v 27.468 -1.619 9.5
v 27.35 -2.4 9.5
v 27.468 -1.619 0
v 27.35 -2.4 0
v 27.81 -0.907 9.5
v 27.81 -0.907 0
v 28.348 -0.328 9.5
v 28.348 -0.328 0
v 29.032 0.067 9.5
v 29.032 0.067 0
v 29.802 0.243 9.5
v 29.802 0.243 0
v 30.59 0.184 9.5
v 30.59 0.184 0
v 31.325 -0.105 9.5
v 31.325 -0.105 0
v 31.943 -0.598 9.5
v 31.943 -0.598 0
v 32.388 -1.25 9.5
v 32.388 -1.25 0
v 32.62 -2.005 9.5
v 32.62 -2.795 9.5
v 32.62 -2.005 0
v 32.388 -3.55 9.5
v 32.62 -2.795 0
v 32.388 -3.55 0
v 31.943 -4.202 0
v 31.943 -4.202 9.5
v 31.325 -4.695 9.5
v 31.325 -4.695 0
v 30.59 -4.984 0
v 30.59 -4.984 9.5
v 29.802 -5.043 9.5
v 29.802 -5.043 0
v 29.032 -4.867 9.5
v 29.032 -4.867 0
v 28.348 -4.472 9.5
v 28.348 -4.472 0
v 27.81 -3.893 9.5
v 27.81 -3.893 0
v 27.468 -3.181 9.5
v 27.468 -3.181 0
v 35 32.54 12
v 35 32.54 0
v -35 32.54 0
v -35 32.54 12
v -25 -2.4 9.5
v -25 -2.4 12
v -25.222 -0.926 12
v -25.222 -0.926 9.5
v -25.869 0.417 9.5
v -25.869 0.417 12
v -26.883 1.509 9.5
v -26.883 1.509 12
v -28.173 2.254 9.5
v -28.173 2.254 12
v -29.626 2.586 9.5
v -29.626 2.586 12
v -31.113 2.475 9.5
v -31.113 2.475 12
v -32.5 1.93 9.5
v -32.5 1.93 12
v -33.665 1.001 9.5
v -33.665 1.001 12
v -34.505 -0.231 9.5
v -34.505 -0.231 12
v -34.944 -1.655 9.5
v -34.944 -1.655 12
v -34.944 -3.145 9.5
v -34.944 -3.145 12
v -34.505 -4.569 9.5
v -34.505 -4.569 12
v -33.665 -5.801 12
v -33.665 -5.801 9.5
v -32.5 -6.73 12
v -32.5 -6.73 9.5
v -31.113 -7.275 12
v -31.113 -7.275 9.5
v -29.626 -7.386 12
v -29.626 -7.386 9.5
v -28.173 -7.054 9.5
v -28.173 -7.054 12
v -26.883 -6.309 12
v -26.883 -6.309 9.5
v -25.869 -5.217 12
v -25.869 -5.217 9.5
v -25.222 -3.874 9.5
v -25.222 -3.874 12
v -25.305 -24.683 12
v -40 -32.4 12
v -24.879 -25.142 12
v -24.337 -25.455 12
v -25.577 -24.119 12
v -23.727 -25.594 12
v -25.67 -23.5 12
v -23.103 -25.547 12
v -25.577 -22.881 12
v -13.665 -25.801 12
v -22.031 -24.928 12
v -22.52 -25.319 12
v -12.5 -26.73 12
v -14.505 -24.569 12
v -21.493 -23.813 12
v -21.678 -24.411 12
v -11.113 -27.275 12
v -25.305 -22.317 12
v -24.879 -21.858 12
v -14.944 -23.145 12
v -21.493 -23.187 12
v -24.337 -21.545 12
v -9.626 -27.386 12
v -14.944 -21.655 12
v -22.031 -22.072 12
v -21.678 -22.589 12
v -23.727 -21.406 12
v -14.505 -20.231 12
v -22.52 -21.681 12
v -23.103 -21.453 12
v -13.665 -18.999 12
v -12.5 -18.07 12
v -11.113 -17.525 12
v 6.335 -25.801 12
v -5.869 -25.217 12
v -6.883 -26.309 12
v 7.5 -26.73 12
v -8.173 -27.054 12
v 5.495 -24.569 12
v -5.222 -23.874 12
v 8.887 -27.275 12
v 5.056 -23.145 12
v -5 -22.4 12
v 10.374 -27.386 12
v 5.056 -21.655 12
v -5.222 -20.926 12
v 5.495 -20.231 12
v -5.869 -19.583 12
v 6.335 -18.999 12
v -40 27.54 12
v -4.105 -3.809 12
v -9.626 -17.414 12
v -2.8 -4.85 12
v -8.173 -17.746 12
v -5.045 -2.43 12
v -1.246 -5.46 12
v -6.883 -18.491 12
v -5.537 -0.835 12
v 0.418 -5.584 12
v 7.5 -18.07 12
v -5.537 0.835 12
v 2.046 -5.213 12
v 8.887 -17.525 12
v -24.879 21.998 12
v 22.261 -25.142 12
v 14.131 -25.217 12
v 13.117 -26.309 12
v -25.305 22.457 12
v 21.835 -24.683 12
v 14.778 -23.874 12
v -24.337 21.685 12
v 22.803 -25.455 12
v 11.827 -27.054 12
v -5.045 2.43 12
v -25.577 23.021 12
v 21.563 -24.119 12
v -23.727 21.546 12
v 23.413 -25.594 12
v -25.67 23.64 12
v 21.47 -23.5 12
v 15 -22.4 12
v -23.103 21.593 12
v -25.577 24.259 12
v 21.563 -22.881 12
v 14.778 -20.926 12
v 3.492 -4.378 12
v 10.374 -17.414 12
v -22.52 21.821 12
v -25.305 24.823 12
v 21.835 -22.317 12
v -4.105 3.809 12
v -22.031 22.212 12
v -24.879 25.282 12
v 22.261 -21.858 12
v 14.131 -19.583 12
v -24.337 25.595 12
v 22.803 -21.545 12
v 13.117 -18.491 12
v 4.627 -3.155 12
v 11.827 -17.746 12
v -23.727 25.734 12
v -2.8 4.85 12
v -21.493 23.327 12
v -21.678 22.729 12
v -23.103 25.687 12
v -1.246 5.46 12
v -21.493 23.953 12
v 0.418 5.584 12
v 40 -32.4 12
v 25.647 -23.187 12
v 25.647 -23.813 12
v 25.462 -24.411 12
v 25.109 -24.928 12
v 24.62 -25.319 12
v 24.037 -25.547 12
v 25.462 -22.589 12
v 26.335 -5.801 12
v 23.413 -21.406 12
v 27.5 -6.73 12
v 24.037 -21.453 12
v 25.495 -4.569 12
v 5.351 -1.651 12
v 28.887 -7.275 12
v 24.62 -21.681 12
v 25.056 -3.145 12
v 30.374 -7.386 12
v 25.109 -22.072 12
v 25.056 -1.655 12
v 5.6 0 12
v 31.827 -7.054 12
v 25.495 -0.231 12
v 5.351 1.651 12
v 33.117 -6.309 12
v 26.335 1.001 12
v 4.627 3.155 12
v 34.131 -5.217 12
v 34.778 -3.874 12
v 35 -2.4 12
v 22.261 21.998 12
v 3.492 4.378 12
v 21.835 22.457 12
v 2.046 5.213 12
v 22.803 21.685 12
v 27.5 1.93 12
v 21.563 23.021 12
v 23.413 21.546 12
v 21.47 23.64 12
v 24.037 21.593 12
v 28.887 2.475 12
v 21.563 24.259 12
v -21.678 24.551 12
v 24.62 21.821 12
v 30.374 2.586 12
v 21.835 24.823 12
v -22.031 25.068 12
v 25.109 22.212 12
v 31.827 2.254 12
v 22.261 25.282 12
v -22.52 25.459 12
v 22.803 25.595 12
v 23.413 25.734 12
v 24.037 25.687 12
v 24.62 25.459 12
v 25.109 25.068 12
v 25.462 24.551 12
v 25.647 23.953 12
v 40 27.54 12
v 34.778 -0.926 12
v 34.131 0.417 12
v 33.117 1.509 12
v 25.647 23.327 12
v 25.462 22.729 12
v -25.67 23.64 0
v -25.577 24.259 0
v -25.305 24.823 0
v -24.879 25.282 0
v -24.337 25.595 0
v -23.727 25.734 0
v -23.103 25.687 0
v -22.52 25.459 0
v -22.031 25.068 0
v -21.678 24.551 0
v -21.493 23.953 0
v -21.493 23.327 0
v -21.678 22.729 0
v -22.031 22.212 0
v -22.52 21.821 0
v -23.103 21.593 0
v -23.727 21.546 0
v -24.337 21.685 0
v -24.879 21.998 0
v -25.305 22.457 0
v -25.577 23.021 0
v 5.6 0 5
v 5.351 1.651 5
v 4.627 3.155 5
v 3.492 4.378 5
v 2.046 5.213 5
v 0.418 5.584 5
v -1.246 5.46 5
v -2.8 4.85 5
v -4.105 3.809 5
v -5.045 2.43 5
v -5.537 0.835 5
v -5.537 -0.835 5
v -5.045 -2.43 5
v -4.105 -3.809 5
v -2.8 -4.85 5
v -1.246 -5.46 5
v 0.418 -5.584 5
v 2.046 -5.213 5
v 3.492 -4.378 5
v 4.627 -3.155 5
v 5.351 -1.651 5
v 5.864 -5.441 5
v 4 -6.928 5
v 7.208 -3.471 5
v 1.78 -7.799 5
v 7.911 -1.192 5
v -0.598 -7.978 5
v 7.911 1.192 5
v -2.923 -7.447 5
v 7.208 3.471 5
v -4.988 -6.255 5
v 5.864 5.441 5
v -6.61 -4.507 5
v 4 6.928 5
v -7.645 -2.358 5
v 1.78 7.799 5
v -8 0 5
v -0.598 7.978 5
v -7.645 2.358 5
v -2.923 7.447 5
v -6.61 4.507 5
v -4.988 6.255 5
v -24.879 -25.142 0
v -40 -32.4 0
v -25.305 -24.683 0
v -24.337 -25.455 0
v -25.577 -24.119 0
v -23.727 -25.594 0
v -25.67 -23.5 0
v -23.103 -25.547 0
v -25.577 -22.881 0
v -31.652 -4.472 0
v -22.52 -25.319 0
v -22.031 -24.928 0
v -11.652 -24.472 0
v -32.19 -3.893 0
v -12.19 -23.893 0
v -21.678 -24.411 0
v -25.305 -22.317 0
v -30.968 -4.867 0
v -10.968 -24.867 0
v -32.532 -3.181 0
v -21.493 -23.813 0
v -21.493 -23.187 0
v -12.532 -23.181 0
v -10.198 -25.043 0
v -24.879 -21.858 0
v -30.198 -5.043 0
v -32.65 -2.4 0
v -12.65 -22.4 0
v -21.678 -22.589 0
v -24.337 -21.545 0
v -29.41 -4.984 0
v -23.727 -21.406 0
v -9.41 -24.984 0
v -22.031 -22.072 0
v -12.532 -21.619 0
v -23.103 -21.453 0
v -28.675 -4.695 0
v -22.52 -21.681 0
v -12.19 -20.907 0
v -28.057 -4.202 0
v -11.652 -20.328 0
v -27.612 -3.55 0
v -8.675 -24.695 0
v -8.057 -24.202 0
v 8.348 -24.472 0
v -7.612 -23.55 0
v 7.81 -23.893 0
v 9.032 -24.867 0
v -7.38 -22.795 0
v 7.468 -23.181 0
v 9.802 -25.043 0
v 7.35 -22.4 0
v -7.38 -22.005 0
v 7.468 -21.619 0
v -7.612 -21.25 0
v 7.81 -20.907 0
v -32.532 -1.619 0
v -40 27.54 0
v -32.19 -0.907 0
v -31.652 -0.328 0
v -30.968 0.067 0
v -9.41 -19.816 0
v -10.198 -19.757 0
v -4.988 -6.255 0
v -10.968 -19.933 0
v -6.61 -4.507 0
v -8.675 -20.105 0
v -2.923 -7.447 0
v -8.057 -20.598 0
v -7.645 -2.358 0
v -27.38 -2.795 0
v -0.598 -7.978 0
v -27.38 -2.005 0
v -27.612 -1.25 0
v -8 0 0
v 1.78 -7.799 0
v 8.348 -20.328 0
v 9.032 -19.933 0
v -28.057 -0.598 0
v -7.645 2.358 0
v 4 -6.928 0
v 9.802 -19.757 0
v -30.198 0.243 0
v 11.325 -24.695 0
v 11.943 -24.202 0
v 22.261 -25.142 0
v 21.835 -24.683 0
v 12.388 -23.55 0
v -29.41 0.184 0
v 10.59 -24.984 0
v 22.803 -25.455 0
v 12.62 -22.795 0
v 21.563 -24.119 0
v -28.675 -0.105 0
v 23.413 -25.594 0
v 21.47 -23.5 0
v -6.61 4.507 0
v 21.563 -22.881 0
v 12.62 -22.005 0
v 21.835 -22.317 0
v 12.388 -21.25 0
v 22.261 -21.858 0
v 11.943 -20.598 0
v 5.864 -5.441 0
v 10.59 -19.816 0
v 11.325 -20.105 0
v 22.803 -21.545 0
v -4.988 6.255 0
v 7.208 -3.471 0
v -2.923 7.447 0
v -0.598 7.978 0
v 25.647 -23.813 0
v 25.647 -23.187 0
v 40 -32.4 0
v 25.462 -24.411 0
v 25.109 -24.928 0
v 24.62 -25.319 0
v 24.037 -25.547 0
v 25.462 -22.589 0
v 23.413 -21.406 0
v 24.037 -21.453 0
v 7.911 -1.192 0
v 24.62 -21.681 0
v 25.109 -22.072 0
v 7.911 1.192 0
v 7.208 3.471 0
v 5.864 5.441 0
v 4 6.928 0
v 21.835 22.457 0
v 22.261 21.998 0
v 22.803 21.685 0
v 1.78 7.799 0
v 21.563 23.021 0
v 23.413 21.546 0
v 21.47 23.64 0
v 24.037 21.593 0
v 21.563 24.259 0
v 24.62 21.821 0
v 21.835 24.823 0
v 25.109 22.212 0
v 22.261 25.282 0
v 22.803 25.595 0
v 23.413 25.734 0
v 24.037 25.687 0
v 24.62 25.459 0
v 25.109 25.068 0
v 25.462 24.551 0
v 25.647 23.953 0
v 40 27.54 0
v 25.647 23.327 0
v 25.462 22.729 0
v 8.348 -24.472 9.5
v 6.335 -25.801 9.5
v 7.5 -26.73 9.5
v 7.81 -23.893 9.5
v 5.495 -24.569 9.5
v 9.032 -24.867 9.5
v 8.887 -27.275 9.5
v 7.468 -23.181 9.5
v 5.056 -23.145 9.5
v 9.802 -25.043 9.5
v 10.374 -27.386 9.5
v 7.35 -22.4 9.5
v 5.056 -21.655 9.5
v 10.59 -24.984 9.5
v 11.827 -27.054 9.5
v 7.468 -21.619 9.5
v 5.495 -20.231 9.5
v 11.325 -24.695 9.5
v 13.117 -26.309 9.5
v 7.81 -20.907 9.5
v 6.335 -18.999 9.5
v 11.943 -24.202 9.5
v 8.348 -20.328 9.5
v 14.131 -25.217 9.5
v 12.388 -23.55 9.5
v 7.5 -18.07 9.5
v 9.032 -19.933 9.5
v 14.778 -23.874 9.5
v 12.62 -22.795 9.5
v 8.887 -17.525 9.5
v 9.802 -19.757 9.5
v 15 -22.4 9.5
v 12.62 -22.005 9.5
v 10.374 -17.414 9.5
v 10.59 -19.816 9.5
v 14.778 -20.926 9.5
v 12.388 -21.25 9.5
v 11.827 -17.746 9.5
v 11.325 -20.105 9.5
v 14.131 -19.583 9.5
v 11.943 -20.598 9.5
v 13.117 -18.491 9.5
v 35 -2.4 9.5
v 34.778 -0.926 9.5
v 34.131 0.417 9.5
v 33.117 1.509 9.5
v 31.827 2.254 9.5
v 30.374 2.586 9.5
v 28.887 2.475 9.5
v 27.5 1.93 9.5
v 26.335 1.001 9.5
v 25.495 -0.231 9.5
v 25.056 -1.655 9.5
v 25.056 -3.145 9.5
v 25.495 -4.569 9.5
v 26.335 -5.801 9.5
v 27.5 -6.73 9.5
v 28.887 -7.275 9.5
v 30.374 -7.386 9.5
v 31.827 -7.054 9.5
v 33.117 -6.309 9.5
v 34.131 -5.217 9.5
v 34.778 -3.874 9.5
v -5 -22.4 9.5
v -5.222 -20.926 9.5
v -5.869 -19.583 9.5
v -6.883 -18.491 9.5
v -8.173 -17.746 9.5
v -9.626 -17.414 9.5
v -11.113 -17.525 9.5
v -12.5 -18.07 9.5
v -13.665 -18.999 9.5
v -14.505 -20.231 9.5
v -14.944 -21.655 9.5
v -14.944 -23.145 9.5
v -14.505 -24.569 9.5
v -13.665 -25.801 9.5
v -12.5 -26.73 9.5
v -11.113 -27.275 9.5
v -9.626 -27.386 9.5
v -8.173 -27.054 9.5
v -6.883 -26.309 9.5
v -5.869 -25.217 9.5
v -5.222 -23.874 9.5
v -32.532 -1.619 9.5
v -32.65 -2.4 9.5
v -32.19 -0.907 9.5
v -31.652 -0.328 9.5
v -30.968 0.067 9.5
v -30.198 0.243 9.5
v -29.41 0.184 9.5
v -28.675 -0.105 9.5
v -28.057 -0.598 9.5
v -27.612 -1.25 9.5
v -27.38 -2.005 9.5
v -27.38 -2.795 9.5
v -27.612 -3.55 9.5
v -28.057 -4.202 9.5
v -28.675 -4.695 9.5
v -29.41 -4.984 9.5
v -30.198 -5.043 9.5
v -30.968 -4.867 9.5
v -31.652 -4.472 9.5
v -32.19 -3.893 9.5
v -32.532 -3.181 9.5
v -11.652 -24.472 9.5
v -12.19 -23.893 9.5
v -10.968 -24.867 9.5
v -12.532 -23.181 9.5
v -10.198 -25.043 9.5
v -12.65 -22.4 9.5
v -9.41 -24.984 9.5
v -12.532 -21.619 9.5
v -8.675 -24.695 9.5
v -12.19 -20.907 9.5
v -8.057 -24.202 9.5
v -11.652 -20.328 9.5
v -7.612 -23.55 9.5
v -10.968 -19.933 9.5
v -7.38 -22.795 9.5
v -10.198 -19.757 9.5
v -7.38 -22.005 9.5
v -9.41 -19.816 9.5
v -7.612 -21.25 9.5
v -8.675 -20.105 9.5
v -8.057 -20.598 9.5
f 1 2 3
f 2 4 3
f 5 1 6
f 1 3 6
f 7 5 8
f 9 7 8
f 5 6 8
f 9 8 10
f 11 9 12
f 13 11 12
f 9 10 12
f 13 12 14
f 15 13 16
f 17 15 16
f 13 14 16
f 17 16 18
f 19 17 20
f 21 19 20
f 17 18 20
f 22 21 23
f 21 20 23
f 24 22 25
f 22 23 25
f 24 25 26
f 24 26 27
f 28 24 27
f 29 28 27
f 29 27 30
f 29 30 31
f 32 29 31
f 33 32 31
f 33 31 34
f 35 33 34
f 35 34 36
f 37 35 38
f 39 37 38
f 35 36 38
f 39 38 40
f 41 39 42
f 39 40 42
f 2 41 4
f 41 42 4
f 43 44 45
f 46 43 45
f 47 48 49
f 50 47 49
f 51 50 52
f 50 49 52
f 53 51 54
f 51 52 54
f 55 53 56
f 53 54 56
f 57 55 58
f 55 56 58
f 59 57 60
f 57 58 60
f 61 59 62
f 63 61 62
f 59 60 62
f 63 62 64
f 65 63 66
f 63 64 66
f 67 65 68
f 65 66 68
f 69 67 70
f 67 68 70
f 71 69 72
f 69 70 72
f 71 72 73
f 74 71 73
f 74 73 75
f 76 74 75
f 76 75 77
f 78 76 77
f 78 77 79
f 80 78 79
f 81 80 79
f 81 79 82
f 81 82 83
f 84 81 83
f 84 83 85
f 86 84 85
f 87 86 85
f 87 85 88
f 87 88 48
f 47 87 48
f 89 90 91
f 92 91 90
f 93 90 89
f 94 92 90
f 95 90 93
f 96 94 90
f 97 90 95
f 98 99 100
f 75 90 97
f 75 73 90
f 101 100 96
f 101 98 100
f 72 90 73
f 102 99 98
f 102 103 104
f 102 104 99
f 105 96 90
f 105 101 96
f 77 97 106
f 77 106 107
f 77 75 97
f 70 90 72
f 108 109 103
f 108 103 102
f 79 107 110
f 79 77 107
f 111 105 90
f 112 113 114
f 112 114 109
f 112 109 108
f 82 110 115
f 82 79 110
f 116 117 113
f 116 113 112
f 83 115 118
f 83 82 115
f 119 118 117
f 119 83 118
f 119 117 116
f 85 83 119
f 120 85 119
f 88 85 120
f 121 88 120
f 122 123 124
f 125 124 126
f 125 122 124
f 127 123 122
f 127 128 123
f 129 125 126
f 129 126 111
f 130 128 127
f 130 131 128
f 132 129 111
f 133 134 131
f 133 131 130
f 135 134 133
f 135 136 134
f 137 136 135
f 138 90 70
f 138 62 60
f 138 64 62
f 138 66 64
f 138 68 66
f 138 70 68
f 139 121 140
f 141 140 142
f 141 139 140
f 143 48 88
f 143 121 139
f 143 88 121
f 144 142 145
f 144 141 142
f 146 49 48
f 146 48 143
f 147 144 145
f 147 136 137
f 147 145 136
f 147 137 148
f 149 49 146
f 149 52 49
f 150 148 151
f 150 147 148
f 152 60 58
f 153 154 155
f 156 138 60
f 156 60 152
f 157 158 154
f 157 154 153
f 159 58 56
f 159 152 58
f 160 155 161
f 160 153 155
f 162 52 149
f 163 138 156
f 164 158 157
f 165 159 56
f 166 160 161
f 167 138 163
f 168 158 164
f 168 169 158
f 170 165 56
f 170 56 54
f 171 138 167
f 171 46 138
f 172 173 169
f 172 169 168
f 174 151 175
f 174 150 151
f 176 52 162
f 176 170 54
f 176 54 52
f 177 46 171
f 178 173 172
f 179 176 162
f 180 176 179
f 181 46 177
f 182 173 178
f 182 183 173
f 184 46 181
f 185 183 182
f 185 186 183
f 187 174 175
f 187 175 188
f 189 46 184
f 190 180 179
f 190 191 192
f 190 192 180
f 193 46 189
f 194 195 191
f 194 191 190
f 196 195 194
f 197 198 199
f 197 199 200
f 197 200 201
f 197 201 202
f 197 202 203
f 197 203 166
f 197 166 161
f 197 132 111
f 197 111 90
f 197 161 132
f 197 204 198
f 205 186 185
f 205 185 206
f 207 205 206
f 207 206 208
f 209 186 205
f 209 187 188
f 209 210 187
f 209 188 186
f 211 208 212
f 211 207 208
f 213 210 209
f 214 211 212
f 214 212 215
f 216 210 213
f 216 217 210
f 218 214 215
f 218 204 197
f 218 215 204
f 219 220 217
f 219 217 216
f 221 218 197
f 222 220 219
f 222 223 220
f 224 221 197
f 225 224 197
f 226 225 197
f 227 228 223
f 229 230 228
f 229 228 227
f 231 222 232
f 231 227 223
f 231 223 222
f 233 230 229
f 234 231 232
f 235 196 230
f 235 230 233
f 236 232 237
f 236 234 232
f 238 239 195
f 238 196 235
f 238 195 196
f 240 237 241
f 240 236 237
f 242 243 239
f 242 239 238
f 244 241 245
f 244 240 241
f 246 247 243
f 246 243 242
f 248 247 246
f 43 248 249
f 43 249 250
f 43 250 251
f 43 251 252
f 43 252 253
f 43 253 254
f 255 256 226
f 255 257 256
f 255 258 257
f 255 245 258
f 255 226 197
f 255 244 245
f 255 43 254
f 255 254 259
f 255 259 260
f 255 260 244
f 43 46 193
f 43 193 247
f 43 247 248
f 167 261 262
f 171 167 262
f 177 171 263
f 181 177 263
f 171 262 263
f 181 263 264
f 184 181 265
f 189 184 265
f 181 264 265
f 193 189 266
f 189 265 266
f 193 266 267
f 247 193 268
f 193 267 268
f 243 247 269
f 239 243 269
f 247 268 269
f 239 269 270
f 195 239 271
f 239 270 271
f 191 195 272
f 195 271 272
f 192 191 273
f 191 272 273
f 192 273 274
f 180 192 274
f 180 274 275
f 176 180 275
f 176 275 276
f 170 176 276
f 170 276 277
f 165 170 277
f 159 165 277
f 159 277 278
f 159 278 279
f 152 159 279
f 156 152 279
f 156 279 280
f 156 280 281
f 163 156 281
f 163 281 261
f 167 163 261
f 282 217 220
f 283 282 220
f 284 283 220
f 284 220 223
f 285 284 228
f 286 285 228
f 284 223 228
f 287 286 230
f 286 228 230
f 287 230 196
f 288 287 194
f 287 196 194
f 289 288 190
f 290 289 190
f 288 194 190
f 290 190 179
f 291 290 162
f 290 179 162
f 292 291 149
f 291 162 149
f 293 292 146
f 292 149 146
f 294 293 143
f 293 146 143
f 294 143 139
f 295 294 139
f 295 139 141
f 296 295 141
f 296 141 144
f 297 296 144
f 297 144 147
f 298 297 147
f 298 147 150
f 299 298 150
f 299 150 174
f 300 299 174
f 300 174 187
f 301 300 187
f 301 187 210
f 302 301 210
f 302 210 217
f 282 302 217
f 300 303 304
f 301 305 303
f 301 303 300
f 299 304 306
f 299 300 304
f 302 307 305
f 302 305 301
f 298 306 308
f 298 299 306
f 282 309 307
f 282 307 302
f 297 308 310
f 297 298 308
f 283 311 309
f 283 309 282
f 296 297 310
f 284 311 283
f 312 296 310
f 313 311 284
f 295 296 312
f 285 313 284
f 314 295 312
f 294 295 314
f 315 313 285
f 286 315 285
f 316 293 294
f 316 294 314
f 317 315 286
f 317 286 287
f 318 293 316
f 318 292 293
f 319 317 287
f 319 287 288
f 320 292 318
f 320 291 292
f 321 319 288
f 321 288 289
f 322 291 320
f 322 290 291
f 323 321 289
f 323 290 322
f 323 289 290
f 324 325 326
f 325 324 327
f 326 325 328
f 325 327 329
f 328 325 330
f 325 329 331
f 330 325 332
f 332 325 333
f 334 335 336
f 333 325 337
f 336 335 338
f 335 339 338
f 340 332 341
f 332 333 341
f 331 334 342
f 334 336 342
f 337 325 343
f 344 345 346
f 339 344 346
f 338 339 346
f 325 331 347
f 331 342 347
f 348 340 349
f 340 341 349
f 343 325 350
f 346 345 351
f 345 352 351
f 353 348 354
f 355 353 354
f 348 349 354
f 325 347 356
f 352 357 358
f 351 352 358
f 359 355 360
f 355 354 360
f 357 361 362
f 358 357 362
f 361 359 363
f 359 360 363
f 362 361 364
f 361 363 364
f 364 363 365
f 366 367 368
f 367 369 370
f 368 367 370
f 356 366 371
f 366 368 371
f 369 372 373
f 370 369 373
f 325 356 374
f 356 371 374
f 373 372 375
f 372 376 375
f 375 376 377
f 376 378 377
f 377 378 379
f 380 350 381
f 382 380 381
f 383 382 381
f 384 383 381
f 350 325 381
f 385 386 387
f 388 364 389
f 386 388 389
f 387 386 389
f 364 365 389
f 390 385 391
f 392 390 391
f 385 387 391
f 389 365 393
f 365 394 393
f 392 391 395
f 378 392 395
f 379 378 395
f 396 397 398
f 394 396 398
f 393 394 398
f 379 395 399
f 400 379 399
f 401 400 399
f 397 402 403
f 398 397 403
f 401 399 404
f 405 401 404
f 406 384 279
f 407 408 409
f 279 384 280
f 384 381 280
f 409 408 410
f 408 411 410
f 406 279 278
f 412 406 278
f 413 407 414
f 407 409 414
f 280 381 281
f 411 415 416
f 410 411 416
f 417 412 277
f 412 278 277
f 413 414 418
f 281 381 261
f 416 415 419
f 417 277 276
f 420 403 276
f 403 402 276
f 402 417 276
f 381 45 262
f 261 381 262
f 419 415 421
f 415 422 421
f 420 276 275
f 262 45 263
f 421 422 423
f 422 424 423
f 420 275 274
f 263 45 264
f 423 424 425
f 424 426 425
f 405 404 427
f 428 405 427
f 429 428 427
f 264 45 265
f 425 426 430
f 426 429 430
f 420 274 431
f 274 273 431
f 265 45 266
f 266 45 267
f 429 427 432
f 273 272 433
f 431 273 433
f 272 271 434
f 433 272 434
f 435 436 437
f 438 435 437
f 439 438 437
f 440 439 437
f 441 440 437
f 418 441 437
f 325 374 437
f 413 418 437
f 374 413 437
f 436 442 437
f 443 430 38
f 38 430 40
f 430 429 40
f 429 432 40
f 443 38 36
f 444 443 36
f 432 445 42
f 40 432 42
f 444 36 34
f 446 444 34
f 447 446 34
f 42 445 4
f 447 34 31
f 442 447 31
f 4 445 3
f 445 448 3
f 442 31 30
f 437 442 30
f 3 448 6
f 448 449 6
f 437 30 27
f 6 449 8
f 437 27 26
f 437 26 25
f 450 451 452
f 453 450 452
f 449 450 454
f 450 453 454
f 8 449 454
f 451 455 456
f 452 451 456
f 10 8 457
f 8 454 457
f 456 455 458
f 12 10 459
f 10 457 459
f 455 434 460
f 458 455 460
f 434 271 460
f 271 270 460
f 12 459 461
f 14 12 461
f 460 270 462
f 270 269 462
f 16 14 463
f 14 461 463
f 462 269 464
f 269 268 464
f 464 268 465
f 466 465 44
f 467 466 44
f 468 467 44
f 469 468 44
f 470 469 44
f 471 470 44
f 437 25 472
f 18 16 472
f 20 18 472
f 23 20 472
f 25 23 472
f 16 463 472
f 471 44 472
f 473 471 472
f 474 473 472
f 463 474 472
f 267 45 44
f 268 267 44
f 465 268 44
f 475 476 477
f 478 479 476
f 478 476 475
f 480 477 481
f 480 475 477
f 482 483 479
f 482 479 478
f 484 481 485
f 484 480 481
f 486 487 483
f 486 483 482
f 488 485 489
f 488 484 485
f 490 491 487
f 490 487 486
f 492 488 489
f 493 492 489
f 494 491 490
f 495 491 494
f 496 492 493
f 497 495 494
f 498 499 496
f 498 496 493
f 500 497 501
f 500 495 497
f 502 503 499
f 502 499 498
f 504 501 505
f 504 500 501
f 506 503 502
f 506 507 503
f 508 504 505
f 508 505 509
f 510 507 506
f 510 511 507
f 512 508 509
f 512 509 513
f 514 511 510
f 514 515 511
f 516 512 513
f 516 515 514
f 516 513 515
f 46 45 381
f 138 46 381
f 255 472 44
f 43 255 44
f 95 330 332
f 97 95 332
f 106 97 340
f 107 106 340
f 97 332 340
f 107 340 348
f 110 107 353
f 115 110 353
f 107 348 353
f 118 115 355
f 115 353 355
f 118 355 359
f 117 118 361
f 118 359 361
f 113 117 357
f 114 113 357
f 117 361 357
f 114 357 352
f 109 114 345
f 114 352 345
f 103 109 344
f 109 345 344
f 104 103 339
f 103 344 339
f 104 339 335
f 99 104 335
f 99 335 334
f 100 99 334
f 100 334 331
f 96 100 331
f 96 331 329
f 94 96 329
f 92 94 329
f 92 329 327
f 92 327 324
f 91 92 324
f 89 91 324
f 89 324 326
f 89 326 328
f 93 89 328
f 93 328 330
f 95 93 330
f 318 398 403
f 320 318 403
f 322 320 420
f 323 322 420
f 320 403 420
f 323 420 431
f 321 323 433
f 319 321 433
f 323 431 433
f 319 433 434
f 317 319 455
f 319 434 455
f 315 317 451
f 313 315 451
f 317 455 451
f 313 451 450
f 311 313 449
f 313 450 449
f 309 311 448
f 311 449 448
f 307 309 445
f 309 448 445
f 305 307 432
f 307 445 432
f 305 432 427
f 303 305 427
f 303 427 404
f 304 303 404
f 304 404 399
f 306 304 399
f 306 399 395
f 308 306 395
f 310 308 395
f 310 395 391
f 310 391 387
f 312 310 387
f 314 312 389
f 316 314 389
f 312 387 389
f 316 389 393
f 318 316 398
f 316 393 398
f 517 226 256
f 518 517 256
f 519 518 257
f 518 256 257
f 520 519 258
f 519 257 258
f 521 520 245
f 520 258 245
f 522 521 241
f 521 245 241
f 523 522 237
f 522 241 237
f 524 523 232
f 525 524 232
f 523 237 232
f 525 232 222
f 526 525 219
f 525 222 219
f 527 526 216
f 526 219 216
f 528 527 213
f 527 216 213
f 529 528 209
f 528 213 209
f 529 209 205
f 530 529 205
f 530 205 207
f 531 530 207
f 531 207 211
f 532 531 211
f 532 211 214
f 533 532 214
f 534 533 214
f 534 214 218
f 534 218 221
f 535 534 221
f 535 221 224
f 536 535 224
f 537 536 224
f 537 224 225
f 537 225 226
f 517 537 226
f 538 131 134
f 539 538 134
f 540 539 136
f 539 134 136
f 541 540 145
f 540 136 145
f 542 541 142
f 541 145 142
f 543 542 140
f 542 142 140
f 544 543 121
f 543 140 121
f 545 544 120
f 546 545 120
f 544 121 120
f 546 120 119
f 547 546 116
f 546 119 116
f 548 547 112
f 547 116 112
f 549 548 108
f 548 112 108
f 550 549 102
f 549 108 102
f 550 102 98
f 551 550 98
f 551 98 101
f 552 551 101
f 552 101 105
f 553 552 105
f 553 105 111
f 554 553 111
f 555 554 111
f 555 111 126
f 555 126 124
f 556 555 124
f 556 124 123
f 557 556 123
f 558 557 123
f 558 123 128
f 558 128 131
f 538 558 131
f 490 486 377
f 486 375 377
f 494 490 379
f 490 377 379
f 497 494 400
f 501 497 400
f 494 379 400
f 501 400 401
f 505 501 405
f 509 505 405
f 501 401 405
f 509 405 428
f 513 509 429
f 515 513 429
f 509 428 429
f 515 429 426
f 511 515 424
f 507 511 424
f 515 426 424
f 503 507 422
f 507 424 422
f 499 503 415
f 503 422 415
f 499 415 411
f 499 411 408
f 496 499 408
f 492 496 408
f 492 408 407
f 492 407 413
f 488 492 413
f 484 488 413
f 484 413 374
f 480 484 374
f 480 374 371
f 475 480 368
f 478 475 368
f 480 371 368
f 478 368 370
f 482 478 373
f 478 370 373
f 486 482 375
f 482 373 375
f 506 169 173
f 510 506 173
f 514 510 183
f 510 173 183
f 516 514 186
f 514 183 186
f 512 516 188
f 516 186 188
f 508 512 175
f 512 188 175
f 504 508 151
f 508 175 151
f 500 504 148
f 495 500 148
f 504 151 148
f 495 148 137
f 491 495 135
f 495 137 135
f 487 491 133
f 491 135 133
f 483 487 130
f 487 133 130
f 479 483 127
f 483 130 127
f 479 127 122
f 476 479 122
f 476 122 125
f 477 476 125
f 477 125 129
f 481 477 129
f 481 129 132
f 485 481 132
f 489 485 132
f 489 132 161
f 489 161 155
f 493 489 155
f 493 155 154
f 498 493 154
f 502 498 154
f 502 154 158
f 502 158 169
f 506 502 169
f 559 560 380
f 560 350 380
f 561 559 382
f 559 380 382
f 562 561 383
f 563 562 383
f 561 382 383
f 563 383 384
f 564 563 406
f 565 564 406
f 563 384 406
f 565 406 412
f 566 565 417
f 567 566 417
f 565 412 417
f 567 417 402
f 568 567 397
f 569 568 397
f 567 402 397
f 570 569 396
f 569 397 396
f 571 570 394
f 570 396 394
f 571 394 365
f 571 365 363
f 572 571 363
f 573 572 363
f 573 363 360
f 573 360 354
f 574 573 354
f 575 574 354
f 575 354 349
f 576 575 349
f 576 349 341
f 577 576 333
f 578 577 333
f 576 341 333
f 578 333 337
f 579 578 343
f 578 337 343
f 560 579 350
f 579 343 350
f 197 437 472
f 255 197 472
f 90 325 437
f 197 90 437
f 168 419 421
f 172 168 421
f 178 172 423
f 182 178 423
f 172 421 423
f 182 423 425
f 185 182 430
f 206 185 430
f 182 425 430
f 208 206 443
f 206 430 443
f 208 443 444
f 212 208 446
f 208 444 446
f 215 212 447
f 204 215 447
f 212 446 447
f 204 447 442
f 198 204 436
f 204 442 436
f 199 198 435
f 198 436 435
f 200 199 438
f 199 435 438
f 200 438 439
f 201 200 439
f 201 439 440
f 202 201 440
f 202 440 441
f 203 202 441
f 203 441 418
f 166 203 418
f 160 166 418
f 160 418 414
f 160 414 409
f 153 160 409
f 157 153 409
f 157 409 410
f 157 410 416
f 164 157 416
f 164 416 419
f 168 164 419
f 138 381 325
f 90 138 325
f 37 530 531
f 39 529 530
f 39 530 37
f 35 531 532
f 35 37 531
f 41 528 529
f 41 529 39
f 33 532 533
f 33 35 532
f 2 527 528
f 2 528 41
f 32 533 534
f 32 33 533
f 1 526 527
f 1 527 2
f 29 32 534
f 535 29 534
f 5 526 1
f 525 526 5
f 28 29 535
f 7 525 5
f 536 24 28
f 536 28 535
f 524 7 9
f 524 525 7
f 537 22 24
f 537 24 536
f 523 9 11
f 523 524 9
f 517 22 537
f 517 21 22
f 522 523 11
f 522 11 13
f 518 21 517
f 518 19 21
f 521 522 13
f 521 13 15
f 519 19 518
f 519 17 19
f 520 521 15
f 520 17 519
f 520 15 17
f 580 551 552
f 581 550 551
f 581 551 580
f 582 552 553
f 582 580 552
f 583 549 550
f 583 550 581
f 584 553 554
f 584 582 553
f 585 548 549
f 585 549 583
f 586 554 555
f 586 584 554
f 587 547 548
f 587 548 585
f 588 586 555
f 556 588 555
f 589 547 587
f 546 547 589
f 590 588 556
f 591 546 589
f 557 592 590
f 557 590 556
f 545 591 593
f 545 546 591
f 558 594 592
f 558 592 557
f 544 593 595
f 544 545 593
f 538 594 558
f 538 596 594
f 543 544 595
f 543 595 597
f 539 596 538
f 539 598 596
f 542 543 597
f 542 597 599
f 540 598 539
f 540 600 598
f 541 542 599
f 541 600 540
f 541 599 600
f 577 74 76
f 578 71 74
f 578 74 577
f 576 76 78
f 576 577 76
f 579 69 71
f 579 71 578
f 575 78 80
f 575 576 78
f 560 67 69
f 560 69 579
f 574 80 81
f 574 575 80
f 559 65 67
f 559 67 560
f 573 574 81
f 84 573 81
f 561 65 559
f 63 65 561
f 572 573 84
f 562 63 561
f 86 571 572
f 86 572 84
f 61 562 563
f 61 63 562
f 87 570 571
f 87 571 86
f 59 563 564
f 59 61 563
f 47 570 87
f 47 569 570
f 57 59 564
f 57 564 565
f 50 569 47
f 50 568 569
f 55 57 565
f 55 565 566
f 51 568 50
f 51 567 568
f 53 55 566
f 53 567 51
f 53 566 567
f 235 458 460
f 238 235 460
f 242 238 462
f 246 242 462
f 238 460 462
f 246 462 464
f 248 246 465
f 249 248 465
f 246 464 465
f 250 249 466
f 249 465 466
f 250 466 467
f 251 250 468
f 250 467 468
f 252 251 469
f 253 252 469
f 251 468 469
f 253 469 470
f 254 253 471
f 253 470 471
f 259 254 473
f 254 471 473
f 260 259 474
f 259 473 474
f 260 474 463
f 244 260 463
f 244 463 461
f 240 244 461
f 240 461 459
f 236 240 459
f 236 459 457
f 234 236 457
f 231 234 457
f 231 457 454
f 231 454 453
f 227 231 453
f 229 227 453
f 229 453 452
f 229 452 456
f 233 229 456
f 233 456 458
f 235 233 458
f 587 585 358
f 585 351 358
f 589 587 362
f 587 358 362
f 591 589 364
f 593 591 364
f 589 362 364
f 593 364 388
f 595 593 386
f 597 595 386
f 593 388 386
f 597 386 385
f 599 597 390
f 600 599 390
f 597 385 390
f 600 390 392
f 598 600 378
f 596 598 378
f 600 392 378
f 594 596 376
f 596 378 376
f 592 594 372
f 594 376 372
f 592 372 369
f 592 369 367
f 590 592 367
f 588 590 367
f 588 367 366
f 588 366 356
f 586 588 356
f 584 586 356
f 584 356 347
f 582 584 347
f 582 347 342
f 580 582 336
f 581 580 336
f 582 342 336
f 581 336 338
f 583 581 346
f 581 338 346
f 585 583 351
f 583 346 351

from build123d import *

# Parameters (mm, degrees)
BOSS_EXTRUDE1_DEPTH                                 = 12
M5_TAPPED_HOLE1_D                                   = 4.2
CBORE_FOR_M5_HEX_SOCKET_HEAD_CAP_SCREW1_D           = 5.3
CBORE_FOR_M5_HEX_SOCKET_HEAD_CAP_SCREW1_CBORE_D     = 10
CBORE_FOR_M5_HEX_SOCKET_HEAD_CAP_SCREW1_CBORE_DEPTH = 2.5
SKETCH8_R                                           = 5.6
CUT_EXTRUDE1_DEPTH                                  = 12
SKETCH9_R                                           = 8
CUT_EXTRUDE2_DEPTH                                  = 5


with BuildPart() as part:
    # Sketch3 → Boss-Extrude1 (new body)
    with BuildSketch(Plane.XY):
        Polygon((-40, -32.4), (40, -32.4), (40, 27.54), (35, 32.54), (-35, 32.54), (-40, 27.54), align=None)
    extrude(amount=BOSS_EXTRUDE1_DEPTH)

    # M5 Tapped Hole1 (through all)
    with Locations(Plane.XY.offset(12)):
        with Locations((-23.57, -23.5), (-23.57, 23.64), (23.57, 23.64), (23.57, -23.5)):
            Hole(M5_TAPPED_HOLE1_D / 2)

    # CBORE for M5 Hex Socket Head Cap Screw1 (through all)
    with Locations(Plane.XY.offset(12)):
        with Locations((-30, -2.4), (-10, -22.4), (10, -22.4), (30, -2.4)):
            CounterBoreHole(CBORE_FOR_M5_HEX_SOCKET_HEAD_CAP_SCREW1_D / 2, CBORE_FOR_M5_HEX_SOCKET_HEAD_CAP_SCREW1_CBORE_D / 2, CBORE_FOR_M5_HEX_SOCKET_HEAD_CAP_SCREW1_CBORE_DEPTH)

    # Sketch8 → Cut-Extrude1 (cut)
    with BuildSketch(Plane.XY.offset(12)):
        Circle(SKETCH8_R)
    extrude(amount=-CUT_EXTRUDE1_DEPTH, mode=Mode.SUBTRACT)

    # Sketch9 → Cut-Extrude2 (cut)
    with BuildSketch(Plane(origin=(0, 0, 0), x_dir=(-1, 0, 0), z_dir=(0, 0, -1))):
        Circle(SKETCH9_R)
    extrude(amount=-CUT_EXTRUDE2_DEPTH, mode=Mode.SUBTRACT)


solid = part.part
